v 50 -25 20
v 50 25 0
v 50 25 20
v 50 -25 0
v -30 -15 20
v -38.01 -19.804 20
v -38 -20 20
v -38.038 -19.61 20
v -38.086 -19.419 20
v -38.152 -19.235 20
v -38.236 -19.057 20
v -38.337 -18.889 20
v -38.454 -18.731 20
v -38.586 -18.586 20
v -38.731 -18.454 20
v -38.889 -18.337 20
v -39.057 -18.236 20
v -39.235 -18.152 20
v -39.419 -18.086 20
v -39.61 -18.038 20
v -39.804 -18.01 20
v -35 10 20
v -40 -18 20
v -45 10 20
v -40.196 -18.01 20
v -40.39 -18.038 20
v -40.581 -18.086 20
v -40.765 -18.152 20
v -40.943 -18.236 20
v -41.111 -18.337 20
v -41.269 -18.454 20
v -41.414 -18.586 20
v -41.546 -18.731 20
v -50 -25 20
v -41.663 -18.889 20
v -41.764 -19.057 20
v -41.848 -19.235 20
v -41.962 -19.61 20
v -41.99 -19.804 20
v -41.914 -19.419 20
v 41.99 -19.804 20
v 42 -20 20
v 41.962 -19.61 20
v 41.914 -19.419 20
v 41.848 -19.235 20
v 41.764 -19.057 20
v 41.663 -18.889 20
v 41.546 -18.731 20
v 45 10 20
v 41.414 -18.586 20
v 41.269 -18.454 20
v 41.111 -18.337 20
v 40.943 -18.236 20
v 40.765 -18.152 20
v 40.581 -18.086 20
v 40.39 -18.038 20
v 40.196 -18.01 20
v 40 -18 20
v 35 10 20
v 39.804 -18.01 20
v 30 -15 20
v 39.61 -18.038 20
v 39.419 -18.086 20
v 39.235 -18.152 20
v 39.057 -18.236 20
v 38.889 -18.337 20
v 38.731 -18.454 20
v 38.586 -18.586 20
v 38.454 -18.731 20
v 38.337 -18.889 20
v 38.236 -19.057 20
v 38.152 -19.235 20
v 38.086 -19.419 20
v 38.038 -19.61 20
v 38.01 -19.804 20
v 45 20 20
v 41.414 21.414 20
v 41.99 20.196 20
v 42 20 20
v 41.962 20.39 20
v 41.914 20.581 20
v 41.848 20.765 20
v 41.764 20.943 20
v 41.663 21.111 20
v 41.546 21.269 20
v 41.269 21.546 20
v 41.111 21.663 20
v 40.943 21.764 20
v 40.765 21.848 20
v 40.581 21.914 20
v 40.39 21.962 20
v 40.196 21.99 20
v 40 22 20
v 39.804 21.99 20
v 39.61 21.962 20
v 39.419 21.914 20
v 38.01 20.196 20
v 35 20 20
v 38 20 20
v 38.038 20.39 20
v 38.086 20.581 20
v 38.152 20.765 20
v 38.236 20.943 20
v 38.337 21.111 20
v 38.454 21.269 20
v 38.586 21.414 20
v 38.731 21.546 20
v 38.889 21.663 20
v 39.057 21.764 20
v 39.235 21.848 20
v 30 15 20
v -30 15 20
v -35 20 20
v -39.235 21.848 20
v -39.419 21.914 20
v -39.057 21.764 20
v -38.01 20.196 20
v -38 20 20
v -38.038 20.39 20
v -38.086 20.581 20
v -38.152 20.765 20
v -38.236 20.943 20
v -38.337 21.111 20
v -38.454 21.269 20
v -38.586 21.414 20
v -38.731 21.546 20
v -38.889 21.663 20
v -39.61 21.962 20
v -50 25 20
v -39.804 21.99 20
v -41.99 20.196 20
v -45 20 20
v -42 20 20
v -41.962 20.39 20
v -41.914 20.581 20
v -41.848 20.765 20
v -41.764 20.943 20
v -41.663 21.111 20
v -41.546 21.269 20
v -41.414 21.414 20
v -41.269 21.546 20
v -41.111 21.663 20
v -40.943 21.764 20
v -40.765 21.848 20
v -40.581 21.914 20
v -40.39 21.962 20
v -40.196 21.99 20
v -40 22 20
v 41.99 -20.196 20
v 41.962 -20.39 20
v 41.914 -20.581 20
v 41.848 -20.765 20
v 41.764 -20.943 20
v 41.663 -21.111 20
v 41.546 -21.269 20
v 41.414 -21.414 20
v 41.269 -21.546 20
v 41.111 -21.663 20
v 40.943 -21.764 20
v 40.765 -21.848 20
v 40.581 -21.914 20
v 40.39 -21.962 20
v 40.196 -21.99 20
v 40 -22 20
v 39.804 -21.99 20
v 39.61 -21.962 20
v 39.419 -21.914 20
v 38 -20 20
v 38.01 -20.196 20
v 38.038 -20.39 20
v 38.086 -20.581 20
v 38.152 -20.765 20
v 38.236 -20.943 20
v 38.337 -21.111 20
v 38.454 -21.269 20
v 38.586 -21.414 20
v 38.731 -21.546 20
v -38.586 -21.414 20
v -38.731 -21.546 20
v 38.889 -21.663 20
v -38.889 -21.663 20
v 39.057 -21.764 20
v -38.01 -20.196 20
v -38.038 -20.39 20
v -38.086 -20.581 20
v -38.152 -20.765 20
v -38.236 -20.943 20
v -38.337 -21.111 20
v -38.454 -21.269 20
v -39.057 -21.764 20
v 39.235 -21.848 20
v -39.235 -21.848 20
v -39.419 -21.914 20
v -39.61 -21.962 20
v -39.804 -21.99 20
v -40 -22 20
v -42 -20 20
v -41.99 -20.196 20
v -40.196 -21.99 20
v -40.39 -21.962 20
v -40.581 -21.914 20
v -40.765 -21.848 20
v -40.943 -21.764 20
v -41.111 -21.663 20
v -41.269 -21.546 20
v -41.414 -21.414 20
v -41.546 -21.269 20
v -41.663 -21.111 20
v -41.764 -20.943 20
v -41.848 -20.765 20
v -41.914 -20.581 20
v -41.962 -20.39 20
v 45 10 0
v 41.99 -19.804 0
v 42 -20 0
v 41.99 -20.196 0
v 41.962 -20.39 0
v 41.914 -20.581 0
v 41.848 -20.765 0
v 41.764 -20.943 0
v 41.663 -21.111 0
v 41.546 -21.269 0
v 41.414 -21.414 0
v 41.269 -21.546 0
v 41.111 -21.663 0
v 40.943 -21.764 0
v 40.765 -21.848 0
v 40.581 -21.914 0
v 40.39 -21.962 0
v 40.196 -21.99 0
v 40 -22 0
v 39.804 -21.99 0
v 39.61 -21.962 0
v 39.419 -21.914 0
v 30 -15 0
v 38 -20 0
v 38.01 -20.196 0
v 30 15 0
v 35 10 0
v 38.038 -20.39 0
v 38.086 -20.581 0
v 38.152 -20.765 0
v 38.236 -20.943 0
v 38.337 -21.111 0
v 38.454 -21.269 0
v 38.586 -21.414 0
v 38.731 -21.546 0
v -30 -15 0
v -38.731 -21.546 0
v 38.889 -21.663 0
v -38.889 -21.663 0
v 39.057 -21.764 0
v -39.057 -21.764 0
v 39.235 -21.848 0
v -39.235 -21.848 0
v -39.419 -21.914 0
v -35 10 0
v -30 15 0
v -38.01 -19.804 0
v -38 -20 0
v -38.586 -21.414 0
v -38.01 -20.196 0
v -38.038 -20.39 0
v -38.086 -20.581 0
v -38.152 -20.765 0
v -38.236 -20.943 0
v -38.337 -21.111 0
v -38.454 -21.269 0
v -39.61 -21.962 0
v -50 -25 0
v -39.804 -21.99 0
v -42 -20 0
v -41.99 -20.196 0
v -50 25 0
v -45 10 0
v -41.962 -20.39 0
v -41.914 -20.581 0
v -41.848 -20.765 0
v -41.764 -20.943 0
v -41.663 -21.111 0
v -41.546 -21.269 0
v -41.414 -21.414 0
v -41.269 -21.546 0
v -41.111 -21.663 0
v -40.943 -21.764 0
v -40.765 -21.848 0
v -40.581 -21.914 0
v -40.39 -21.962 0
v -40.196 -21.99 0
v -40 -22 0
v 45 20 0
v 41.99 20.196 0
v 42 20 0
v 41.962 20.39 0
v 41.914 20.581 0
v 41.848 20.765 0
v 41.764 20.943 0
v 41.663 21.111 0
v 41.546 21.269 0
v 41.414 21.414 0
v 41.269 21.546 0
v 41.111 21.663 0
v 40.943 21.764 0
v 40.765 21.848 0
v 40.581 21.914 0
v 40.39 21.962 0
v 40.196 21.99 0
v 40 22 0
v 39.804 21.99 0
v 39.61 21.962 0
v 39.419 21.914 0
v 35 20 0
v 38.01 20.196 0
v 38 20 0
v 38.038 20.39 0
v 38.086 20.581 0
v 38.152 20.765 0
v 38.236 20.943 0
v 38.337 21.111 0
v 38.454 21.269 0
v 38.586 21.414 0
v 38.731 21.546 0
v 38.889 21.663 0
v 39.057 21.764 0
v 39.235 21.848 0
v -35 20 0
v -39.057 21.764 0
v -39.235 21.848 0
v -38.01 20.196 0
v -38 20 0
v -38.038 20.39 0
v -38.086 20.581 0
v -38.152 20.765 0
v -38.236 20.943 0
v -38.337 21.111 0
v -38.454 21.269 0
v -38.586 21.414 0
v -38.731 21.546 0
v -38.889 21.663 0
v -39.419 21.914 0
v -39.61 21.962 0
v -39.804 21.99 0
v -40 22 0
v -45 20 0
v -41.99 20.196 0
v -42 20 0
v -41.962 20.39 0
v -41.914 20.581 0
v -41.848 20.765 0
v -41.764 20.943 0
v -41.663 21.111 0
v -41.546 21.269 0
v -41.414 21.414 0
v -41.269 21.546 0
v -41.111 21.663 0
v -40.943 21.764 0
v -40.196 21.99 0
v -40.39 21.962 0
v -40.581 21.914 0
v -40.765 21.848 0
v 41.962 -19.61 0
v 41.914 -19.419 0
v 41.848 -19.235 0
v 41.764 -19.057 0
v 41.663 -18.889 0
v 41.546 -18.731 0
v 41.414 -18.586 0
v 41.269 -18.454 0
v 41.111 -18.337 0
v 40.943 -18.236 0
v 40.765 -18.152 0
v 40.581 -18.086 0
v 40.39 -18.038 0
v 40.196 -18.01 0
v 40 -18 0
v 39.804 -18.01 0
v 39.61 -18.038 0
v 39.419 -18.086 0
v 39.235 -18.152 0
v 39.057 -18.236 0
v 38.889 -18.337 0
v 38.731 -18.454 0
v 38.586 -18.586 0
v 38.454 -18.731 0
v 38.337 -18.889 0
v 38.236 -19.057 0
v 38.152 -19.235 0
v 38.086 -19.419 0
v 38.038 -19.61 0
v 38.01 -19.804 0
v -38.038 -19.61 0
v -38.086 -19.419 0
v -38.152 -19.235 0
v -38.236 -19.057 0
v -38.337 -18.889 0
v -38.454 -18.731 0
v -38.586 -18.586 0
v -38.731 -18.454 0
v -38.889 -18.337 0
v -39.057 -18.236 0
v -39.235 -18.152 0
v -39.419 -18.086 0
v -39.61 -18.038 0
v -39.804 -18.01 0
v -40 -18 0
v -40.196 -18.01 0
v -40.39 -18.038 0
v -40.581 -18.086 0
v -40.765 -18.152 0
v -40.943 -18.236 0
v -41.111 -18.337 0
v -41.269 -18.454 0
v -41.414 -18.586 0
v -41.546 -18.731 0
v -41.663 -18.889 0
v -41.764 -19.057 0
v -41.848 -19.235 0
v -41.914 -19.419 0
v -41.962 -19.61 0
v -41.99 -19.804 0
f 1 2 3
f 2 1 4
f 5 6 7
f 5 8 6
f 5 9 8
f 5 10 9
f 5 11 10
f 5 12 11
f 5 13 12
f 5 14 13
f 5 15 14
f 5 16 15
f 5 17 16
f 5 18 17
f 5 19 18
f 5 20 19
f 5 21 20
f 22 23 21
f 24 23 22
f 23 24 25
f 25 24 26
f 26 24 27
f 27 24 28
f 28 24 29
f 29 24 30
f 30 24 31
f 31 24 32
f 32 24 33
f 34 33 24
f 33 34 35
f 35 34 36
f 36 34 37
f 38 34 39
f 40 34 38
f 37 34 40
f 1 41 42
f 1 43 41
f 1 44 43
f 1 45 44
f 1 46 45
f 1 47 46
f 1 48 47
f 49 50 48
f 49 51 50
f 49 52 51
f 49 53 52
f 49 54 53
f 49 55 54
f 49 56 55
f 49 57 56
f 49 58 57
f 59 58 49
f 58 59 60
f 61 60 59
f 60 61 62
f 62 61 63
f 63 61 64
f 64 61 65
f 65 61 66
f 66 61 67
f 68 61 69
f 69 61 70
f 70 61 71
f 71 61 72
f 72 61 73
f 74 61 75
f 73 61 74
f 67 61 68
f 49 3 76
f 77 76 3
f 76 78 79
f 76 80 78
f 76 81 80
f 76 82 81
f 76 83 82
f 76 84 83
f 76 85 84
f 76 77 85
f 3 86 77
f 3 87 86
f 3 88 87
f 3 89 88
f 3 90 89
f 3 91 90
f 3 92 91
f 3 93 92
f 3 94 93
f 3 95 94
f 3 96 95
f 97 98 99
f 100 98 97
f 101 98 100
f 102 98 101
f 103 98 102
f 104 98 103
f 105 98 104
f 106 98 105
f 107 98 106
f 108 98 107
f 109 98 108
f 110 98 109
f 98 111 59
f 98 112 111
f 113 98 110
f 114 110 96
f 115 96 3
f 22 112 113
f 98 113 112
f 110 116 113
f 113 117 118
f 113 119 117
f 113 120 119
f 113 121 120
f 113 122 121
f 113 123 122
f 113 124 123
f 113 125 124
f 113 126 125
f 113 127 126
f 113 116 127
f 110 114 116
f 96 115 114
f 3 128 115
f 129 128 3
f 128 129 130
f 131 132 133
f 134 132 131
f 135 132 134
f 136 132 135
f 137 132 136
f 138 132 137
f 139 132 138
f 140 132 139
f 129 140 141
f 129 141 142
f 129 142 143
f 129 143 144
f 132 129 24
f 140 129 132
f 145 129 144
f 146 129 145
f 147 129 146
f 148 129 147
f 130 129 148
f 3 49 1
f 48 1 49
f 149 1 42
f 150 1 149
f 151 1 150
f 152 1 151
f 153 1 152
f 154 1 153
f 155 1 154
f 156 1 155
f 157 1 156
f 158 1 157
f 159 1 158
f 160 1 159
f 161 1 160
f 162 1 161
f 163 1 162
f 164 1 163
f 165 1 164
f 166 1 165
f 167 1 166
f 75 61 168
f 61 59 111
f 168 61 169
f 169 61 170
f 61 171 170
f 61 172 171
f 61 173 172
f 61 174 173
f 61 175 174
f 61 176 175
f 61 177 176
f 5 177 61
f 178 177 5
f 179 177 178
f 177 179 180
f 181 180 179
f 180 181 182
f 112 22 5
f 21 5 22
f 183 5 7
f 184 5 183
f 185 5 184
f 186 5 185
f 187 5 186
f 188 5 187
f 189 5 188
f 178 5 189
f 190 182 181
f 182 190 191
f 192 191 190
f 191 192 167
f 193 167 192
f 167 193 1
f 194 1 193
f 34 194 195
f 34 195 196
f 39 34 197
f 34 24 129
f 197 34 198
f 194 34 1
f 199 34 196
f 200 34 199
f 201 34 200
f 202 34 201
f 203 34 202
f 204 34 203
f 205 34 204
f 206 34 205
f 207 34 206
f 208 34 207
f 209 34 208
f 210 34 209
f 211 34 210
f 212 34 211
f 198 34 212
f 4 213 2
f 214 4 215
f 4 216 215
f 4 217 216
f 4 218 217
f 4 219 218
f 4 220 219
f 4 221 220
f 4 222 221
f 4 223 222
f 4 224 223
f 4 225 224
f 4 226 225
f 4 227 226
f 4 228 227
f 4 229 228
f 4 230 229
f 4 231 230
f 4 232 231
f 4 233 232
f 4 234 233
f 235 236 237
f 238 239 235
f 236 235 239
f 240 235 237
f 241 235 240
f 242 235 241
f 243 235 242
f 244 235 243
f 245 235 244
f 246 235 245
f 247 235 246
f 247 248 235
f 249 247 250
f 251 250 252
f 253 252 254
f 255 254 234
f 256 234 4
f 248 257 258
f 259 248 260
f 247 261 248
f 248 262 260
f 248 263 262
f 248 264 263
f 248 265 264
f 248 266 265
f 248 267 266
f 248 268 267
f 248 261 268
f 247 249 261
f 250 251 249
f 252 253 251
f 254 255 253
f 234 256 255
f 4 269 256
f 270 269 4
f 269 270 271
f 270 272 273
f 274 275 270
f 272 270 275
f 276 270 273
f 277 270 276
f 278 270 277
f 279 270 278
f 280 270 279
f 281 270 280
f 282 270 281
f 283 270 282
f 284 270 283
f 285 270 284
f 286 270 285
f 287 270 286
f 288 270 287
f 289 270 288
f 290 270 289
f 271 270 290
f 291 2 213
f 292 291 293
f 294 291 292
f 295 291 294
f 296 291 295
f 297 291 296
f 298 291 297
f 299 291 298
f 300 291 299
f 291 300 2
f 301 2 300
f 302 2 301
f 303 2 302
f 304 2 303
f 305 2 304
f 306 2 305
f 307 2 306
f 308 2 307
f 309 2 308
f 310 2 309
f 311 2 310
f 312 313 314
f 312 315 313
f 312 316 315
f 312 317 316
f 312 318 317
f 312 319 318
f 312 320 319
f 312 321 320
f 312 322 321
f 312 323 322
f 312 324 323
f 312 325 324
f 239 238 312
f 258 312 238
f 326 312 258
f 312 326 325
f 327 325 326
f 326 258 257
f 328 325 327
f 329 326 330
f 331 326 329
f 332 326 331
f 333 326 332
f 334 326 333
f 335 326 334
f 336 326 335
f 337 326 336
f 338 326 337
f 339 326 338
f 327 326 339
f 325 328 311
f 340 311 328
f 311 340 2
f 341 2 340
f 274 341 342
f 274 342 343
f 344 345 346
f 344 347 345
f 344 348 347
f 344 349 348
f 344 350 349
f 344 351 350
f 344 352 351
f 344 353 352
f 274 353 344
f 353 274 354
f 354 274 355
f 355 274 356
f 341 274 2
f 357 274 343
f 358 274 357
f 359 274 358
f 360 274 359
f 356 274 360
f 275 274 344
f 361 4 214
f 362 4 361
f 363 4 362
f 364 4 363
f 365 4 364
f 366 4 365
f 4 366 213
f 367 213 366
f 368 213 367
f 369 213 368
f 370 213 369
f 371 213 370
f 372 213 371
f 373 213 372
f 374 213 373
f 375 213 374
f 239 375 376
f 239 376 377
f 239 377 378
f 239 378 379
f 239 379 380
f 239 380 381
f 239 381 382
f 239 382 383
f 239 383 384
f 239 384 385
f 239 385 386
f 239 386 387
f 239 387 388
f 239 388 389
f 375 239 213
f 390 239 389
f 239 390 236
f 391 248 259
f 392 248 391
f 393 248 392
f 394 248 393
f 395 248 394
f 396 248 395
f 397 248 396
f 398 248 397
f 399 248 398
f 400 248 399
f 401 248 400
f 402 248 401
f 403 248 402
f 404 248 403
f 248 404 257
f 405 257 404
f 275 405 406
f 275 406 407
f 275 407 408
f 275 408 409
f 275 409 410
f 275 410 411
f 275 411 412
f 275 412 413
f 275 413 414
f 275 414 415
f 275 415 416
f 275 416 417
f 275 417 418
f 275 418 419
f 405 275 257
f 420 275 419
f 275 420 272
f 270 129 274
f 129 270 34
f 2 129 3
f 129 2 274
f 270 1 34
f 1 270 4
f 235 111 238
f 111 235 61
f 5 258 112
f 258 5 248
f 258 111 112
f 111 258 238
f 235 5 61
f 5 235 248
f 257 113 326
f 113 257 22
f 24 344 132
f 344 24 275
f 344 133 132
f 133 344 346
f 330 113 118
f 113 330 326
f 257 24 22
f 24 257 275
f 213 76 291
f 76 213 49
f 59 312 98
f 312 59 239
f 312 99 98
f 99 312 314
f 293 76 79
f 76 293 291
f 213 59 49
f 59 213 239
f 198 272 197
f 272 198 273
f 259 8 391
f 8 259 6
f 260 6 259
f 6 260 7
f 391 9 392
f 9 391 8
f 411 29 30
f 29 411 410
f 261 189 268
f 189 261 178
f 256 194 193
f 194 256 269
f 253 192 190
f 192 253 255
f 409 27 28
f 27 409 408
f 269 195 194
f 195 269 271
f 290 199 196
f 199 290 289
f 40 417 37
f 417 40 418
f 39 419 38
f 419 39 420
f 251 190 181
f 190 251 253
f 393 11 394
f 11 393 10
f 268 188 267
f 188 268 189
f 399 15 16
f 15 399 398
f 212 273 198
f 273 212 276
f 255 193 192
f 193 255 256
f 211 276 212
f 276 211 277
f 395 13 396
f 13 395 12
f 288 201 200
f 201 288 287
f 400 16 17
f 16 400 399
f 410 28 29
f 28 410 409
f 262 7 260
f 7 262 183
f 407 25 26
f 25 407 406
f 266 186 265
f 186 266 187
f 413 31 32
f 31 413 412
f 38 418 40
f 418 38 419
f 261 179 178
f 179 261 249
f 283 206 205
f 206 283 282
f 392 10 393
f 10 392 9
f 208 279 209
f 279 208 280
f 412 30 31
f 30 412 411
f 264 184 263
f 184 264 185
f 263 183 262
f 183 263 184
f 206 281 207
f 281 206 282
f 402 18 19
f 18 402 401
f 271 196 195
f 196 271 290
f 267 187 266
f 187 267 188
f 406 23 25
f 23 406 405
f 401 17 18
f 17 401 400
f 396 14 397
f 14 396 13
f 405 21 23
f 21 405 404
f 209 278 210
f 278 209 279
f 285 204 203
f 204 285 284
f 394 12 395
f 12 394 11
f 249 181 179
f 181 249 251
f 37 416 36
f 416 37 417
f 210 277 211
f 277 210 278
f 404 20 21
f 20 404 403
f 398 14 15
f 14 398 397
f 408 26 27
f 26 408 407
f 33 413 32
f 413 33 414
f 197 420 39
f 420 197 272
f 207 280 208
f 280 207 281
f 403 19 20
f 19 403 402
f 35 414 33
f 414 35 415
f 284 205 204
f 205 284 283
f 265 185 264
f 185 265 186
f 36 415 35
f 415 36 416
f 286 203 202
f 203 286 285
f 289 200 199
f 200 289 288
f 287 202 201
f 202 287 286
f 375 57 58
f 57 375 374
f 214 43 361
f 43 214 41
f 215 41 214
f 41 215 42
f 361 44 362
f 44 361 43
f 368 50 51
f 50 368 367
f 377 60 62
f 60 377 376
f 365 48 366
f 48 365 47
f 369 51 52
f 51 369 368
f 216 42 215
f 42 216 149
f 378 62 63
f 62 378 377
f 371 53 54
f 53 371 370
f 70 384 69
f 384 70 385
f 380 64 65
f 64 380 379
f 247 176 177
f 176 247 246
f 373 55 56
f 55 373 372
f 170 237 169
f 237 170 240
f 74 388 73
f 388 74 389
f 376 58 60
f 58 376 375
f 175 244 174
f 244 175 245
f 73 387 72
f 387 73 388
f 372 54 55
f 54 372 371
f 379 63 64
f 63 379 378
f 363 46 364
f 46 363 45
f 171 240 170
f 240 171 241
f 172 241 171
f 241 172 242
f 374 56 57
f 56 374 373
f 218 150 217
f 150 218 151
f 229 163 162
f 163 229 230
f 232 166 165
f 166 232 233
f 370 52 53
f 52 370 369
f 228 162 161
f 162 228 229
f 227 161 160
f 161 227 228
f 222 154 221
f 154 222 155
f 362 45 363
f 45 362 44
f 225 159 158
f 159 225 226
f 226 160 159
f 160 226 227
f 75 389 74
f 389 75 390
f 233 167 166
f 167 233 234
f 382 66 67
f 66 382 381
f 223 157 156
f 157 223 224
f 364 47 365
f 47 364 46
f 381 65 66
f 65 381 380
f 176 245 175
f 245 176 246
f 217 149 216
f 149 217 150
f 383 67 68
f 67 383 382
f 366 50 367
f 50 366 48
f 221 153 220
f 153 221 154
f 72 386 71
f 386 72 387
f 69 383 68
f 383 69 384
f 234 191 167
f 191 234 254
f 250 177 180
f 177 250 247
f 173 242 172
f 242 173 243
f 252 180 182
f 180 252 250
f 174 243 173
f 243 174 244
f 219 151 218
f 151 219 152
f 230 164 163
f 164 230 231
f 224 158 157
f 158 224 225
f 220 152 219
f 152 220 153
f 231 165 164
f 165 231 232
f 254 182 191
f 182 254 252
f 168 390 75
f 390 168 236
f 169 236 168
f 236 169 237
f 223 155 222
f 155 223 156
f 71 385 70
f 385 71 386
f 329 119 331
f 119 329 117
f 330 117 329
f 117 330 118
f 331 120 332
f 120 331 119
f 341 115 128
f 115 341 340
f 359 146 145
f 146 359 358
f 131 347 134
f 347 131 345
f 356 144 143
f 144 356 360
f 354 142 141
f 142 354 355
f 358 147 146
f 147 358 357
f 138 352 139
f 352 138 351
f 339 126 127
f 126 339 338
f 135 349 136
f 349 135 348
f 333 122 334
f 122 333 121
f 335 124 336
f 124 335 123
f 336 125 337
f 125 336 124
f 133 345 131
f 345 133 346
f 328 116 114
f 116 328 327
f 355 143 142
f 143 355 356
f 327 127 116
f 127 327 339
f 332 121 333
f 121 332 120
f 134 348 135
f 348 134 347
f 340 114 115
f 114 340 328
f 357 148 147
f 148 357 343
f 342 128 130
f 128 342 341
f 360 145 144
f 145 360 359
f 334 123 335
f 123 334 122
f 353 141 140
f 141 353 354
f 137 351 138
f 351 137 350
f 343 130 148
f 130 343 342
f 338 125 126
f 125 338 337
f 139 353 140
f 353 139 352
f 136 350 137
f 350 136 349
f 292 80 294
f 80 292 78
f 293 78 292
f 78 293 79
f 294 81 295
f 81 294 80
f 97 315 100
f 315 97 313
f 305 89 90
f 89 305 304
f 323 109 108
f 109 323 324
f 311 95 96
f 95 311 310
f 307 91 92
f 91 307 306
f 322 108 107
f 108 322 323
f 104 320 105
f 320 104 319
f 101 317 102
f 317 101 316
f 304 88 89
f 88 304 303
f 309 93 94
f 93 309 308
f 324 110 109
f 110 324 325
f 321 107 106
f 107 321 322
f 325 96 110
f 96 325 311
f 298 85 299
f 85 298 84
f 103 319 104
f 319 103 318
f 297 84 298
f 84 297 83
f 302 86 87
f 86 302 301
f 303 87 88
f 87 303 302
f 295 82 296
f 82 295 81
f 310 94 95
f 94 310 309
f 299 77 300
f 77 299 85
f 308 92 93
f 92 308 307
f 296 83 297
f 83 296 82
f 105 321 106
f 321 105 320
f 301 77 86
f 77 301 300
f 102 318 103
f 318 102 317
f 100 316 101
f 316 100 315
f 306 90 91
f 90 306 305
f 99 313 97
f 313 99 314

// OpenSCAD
module panel_meter() {
    difference() {
        // Main body of the panel meter
        translate([-50, -25, 0])
        cube([100, 50, 20]);

        // Display cutout
        translate([-30, -15, -1])
        cube([60, 30, 21]);

        // Button cutouts
        translate([-45, 10, -1])
        cube([10, 10, 21]);
        translate([35, 10, -1])
        cube([10, 10, 21]);

        // Mounting holes
        translate([-40, -20, -1])
        cylinder(h=22, r=2, $fn=64);
        translate([40, -20, -1])
        cylinder(h=22, r=2, $fn=64);
        translate([-40, 20, -1])
        cylinder(h=22, r=2, $fn=64);
        translate([40, 20, -1])
        cylinder(h=22, r=2, $fn=64);
    }
}

panel_meter();
